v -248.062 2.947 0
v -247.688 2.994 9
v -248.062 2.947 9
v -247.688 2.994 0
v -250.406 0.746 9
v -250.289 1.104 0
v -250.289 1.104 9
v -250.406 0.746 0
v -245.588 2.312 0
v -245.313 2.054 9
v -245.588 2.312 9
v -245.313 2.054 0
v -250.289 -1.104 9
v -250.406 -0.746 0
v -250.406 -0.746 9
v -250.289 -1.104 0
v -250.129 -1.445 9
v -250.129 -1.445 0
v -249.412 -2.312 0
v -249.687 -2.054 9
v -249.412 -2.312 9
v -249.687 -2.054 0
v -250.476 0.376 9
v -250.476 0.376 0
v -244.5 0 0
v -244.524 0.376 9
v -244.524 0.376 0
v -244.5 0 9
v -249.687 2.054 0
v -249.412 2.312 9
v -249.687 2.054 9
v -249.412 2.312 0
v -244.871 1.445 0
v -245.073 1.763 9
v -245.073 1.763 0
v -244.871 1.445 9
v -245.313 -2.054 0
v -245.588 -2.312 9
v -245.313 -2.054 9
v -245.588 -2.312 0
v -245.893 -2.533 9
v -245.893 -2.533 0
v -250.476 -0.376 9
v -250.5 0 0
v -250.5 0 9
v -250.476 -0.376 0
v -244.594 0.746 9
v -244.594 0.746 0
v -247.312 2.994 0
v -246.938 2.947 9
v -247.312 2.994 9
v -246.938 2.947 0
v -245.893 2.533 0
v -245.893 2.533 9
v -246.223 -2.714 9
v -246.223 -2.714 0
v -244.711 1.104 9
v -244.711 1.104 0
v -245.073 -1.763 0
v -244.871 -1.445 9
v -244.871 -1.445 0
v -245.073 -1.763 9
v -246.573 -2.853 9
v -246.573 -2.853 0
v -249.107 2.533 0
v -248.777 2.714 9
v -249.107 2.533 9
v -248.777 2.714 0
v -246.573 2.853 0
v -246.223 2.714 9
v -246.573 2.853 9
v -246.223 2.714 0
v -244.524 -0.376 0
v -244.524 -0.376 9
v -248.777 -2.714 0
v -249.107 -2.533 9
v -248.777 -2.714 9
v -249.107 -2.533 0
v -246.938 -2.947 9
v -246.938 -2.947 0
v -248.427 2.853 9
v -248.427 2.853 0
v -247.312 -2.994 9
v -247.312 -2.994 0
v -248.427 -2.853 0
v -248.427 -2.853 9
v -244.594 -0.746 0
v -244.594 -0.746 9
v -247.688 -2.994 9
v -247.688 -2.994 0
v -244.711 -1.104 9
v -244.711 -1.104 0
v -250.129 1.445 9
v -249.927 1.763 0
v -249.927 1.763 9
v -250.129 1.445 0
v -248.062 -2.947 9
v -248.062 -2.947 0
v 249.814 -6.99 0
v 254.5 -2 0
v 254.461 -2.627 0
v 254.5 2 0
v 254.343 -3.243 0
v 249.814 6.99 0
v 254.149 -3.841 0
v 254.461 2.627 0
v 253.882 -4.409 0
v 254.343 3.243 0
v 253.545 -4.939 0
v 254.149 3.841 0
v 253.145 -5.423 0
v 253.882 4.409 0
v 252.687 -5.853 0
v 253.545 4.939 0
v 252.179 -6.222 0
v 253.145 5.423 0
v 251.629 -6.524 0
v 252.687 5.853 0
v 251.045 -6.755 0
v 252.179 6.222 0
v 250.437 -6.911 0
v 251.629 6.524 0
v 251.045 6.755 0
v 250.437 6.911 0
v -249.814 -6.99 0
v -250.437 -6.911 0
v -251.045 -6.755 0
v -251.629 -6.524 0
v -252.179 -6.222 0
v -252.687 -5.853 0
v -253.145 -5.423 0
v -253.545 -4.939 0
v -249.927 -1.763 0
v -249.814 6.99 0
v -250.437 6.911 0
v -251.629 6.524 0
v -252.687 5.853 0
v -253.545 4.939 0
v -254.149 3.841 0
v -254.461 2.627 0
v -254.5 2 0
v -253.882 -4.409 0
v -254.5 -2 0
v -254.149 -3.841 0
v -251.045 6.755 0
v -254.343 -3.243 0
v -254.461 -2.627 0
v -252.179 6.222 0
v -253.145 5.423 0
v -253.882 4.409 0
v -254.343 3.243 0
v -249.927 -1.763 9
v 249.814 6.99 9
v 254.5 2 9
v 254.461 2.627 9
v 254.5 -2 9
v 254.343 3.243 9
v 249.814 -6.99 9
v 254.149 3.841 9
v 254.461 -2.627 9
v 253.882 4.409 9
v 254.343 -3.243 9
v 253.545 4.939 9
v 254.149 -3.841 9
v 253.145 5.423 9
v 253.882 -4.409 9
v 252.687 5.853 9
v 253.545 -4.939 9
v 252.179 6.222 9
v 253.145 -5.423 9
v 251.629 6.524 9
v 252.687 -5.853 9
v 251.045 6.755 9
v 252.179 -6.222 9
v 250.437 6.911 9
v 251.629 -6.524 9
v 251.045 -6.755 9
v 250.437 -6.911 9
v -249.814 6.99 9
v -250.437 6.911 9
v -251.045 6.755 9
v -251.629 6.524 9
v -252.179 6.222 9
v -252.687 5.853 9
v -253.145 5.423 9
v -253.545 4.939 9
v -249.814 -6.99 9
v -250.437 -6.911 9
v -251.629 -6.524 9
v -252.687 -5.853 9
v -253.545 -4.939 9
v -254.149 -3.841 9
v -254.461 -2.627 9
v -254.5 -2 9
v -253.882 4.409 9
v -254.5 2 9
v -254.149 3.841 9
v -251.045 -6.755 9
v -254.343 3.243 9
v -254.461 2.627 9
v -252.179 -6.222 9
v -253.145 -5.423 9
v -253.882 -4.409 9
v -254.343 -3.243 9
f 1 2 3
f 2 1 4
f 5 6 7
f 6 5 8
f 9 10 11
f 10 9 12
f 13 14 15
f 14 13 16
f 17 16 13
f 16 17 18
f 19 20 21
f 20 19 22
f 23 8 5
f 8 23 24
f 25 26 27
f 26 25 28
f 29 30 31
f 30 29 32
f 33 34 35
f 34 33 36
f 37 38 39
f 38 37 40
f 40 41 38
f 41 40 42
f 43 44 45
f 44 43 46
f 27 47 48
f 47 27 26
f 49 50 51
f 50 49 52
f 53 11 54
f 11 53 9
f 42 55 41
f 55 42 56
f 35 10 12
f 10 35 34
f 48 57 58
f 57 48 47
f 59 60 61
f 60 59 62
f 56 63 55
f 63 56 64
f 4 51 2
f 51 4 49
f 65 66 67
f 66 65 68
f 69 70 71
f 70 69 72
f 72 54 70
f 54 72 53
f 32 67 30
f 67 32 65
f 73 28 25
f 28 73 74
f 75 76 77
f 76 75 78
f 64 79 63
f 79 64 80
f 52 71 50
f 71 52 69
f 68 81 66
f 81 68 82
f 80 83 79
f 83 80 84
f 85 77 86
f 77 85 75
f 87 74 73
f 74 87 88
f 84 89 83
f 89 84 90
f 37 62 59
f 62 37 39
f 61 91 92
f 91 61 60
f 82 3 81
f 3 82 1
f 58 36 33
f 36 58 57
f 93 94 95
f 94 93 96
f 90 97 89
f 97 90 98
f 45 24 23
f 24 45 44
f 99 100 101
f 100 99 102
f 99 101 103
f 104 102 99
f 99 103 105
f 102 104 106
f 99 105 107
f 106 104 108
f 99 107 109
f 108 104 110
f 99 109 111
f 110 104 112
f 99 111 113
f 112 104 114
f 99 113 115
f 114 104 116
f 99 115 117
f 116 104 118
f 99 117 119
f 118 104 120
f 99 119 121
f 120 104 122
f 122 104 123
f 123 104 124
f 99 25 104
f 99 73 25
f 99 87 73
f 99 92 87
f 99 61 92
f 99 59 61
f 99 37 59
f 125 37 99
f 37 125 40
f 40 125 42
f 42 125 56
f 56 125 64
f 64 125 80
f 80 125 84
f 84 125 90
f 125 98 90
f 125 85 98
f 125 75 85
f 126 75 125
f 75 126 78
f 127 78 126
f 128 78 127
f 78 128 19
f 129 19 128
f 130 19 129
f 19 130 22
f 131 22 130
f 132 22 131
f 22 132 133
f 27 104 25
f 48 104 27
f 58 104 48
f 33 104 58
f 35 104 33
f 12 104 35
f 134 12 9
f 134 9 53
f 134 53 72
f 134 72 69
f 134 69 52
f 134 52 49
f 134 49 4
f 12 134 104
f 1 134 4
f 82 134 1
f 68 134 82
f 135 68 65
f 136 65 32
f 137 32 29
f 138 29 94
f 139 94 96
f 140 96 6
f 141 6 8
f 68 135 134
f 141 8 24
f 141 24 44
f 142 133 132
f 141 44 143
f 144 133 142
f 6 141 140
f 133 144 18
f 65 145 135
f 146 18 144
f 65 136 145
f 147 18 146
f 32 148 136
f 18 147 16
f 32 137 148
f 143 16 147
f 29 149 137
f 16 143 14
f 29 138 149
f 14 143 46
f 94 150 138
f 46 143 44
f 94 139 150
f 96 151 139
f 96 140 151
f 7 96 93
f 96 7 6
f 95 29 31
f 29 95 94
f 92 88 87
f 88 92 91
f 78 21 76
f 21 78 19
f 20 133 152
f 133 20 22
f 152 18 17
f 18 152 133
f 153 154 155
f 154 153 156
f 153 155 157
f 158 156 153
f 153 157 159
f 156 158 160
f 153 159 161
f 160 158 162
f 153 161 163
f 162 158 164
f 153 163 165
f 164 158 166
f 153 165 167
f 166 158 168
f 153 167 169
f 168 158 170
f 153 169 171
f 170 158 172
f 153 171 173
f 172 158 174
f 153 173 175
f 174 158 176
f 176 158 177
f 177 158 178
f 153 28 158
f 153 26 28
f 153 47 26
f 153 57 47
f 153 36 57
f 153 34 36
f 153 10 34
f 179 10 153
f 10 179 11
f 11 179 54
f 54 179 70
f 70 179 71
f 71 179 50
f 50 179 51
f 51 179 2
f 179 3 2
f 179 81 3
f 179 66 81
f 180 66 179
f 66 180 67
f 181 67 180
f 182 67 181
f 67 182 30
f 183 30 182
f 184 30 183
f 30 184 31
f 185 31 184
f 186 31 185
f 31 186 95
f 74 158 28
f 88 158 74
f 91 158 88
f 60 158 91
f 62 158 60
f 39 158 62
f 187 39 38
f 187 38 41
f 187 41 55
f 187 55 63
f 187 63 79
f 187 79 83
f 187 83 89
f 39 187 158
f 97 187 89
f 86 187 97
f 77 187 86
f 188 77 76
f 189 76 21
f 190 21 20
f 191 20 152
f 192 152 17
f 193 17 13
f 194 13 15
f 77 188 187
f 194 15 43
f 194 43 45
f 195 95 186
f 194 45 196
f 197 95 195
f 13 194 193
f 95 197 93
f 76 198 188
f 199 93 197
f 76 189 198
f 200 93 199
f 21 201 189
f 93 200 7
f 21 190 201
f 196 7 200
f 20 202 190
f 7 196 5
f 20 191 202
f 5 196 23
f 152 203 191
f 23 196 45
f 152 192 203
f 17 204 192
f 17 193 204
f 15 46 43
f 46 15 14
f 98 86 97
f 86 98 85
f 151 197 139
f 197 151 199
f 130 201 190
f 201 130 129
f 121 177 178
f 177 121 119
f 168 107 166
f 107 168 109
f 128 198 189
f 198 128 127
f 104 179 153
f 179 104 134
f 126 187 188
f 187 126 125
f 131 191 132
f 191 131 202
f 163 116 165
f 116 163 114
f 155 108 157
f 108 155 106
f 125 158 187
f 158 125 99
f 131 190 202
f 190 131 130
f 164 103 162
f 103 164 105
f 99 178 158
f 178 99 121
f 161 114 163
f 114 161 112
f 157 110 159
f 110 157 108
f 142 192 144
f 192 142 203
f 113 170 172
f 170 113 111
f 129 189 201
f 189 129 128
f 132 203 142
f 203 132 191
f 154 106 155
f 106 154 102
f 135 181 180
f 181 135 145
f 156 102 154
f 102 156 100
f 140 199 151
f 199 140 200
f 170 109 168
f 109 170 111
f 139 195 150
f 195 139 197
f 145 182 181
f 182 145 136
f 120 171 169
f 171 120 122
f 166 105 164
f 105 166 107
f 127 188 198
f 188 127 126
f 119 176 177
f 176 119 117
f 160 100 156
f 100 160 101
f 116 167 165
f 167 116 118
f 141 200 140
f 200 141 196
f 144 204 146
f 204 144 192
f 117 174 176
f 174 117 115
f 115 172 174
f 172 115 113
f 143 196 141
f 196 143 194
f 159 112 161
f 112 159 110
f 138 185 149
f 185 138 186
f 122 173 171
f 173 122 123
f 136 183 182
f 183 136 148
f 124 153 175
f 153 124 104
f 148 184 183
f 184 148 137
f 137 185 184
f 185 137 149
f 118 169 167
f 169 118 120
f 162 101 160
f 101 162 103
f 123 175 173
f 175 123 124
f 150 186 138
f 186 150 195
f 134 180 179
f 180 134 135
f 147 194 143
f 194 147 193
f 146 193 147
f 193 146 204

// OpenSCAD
$fn = 50;


difference() {
	union() {
		hull() {
			translate(v = [-249.5000000000, 2.0000000000, 0]) {
				cylinder(h = 9, r = 5);
			}
			translate(v = [249.5000000000, 2.0000000000, 0]) {
				cylinder(h = 9, r = 5);
			}
			translate(v = [-249.5000000000, -2.0000000000, 0]) {
				cylinder(h = 9, r = 5);
			}
			translate(v = [249.5000000000, -2.0000000000, 0]) {
				cylinder(h = 9, r = 5);
			}
		}
	}
	union() {
		translate(v = [-247.5000000000, 0.0000000000, 0]) {
			cylinder(h = 9, r = 3.0000000000);
		}
		translate(v = [-247.5000000000, 0.0000000000, 0]) {
			cylinder(h = 9, r = 1.5000000000);
		}
		translate(v = [-247.5000000000, 0.0000000000, 0]) {
			cylinder(h = 9, r = 1.5000000000);
		}
		translate(v = [-247.5000000000, 0.0000000000, 0]) {
			cylinder(h = 9, r = 1.5000000000);
		}
	}
}
